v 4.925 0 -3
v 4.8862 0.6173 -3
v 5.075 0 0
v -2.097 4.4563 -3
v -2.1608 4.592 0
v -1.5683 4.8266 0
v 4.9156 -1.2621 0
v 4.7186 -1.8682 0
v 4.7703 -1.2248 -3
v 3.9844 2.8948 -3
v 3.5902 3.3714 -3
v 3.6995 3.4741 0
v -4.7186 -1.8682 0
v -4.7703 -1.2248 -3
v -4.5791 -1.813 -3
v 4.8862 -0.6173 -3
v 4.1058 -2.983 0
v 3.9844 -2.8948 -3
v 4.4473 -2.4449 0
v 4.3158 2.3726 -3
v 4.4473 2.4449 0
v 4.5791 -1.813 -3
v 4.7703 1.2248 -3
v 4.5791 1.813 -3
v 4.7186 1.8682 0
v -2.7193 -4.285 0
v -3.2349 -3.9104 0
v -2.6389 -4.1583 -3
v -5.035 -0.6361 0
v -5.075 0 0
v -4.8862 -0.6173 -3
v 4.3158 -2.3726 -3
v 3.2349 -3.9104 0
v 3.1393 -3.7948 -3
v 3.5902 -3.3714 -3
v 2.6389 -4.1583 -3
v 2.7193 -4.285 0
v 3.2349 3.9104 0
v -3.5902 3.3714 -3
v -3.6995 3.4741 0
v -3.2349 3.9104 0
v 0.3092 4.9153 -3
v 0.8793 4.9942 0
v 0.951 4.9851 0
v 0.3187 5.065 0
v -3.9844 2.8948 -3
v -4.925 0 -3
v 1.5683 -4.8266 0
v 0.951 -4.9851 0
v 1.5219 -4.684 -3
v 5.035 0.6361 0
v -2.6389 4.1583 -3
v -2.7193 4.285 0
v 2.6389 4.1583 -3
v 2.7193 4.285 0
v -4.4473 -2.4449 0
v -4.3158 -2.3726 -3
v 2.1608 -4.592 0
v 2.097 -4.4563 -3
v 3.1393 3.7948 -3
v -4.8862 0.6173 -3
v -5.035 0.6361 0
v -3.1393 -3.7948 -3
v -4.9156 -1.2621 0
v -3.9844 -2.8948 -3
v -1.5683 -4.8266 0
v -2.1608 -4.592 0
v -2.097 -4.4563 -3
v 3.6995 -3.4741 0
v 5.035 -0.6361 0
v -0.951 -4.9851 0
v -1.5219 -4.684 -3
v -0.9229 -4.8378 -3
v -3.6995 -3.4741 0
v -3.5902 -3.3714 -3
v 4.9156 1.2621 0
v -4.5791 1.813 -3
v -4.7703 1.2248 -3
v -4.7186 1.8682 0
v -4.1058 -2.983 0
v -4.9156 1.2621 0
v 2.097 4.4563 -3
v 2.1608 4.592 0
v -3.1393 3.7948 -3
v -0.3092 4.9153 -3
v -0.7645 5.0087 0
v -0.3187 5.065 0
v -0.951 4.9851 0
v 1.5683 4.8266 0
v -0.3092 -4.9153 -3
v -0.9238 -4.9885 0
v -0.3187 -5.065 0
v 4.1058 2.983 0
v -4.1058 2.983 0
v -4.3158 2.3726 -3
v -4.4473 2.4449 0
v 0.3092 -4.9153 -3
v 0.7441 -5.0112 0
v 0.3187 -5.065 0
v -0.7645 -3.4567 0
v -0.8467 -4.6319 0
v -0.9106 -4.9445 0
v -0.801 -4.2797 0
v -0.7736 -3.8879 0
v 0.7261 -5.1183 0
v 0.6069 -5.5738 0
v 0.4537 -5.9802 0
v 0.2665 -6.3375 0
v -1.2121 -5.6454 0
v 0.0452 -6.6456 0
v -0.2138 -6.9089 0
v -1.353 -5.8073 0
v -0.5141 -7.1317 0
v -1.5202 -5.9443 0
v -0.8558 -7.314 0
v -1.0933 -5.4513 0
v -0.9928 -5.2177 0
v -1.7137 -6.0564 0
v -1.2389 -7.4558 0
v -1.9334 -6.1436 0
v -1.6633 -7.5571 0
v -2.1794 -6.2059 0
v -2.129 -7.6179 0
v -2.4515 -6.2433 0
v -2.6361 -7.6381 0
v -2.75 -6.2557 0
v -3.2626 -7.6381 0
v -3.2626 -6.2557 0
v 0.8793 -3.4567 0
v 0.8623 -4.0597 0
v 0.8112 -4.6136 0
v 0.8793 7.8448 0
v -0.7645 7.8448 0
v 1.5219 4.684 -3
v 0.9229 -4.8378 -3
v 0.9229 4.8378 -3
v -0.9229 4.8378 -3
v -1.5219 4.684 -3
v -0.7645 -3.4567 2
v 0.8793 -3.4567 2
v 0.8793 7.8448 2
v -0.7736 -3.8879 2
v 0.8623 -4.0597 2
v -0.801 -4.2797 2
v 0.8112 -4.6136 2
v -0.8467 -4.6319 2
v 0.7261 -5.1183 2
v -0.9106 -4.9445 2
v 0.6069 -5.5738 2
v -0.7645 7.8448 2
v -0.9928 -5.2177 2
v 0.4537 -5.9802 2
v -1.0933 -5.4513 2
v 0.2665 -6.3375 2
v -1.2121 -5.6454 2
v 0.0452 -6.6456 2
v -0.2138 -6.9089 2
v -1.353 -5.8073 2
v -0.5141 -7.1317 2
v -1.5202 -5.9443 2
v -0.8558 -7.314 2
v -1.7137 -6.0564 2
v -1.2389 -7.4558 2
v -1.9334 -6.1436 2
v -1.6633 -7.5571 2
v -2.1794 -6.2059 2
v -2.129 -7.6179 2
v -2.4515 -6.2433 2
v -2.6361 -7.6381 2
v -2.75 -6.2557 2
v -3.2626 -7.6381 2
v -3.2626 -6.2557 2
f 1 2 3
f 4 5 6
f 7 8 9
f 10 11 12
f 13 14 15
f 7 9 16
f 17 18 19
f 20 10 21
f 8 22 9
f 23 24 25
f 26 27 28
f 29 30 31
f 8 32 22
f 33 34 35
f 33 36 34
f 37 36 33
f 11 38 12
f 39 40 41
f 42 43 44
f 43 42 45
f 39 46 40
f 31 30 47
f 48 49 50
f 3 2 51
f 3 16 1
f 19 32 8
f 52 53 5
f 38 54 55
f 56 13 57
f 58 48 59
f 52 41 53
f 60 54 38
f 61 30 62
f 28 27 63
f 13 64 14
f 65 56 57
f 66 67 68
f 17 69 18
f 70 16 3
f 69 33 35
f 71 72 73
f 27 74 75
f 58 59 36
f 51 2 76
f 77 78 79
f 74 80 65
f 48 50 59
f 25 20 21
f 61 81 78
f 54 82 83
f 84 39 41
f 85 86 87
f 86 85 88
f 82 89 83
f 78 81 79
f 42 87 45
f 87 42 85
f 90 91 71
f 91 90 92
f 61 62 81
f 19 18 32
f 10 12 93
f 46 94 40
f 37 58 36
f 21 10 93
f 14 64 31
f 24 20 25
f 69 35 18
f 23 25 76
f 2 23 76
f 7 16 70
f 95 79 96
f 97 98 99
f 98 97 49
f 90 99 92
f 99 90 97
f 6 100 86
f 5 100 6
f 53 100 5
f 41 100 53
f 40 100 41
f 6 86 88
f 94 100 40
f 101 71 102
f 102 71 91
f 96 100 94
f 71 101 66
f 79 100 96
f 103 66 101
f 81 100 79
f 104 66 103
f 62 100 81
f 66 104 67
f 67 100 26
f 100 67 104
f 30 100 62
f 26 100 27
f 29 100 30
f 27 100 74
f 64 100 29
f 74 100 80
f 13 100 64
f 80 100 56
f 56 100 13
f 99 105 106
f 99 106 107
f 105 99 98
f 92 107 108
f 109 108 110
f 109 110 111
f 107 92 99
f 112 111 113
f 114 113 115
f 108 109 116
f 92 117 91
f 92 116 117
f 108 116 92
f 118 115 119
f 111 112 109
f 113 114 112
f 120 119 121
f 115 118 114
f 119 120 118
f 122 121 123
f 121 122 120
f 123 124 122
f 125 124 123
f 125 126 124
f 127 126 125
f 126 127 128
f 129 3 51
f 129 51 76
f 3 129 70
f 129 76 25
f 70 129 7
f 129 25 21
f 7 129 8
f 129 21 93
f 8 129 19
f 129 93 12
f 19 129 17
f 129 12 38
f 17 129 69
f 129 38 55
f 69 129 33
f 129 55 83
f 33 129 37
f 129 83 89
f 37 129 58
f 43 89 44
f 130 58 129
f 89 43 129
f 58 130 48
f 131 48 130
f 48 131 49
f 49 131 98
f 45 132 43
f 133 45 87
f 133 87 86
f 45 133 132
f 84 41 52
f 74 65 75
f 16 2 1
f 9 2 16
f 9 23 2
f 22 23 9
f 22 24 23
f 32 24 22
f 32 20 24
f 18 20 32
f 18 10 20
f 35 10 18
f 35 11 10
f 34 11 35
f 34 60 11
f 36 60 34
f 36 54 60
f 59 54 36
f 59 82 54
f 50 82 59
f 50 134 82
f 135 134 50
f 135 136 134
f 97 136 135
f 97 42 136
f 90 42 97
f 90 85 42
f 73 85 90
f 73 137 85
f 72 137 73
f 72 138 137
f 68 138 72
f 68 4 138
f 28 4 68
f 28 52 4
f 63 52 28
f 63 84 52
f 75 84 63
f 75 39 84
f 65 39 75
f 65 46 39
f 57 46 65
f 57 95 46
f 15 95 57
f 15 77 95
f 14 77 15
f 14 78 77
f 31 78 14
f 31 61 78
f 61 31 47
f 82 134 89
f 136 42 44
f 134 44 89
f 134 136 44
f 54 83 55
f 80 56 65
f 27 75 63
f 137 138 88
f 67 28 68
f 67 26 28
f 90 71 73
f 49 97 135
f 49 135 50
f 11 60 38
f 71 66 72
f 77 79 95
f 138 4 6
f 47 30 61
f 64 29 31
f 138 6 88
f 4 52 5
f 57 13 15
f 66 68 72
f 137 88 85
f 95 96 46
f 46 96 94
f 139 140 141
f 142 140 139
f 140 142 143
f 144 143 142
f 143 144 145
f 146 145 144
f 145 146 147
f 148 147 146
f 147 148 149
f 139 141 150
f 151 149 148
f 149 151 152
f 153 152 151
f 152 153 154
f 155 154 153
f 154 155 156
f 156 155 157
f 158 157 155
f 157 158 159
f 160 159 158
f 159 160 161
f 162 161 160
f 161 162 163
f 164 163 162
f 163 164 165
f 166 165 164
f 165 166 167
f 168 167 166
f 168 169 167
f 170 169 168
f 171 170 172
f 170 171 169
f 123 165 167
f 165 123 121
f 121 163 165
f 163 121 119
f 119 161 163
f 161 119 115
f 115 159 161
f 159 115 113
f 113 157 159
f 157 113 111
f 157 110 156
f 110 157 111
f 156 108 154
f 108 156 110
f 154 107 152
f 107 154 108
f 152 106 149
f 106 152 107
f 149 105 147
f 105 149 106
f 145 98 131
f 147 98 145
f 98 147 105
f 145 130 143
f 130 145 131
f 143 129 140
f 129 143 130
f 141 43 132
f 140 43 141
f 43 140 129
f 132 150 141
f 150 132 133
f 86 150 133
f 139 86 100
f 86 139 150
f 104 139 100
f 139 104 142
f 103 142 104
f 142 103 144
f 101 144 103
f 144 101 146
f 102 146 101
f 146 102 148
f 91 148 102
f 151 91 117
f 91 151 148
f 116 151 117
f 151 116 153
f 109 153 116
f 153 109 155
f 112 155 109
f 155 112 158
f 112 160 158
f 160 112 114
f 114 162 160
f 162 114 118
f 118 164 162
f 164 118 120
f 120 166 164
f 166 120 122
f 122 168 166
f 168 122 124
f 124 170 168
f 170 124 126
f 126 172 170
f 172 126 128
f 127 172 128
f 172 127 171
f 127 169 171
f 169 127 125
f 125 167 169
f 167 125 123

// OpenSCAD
$fn = 50;

difference() {
	union() {
		translate(v = [0, 0, -3.0]) {
			cylinder(h = 3, r1 = 4.925, r2 = 5.075);
		}
		linear_extrude(height = 2) {
			text(font = "Impact", halign = "center", size = 12, text = "J", valign = "center");
		}
	}
	union();
}
